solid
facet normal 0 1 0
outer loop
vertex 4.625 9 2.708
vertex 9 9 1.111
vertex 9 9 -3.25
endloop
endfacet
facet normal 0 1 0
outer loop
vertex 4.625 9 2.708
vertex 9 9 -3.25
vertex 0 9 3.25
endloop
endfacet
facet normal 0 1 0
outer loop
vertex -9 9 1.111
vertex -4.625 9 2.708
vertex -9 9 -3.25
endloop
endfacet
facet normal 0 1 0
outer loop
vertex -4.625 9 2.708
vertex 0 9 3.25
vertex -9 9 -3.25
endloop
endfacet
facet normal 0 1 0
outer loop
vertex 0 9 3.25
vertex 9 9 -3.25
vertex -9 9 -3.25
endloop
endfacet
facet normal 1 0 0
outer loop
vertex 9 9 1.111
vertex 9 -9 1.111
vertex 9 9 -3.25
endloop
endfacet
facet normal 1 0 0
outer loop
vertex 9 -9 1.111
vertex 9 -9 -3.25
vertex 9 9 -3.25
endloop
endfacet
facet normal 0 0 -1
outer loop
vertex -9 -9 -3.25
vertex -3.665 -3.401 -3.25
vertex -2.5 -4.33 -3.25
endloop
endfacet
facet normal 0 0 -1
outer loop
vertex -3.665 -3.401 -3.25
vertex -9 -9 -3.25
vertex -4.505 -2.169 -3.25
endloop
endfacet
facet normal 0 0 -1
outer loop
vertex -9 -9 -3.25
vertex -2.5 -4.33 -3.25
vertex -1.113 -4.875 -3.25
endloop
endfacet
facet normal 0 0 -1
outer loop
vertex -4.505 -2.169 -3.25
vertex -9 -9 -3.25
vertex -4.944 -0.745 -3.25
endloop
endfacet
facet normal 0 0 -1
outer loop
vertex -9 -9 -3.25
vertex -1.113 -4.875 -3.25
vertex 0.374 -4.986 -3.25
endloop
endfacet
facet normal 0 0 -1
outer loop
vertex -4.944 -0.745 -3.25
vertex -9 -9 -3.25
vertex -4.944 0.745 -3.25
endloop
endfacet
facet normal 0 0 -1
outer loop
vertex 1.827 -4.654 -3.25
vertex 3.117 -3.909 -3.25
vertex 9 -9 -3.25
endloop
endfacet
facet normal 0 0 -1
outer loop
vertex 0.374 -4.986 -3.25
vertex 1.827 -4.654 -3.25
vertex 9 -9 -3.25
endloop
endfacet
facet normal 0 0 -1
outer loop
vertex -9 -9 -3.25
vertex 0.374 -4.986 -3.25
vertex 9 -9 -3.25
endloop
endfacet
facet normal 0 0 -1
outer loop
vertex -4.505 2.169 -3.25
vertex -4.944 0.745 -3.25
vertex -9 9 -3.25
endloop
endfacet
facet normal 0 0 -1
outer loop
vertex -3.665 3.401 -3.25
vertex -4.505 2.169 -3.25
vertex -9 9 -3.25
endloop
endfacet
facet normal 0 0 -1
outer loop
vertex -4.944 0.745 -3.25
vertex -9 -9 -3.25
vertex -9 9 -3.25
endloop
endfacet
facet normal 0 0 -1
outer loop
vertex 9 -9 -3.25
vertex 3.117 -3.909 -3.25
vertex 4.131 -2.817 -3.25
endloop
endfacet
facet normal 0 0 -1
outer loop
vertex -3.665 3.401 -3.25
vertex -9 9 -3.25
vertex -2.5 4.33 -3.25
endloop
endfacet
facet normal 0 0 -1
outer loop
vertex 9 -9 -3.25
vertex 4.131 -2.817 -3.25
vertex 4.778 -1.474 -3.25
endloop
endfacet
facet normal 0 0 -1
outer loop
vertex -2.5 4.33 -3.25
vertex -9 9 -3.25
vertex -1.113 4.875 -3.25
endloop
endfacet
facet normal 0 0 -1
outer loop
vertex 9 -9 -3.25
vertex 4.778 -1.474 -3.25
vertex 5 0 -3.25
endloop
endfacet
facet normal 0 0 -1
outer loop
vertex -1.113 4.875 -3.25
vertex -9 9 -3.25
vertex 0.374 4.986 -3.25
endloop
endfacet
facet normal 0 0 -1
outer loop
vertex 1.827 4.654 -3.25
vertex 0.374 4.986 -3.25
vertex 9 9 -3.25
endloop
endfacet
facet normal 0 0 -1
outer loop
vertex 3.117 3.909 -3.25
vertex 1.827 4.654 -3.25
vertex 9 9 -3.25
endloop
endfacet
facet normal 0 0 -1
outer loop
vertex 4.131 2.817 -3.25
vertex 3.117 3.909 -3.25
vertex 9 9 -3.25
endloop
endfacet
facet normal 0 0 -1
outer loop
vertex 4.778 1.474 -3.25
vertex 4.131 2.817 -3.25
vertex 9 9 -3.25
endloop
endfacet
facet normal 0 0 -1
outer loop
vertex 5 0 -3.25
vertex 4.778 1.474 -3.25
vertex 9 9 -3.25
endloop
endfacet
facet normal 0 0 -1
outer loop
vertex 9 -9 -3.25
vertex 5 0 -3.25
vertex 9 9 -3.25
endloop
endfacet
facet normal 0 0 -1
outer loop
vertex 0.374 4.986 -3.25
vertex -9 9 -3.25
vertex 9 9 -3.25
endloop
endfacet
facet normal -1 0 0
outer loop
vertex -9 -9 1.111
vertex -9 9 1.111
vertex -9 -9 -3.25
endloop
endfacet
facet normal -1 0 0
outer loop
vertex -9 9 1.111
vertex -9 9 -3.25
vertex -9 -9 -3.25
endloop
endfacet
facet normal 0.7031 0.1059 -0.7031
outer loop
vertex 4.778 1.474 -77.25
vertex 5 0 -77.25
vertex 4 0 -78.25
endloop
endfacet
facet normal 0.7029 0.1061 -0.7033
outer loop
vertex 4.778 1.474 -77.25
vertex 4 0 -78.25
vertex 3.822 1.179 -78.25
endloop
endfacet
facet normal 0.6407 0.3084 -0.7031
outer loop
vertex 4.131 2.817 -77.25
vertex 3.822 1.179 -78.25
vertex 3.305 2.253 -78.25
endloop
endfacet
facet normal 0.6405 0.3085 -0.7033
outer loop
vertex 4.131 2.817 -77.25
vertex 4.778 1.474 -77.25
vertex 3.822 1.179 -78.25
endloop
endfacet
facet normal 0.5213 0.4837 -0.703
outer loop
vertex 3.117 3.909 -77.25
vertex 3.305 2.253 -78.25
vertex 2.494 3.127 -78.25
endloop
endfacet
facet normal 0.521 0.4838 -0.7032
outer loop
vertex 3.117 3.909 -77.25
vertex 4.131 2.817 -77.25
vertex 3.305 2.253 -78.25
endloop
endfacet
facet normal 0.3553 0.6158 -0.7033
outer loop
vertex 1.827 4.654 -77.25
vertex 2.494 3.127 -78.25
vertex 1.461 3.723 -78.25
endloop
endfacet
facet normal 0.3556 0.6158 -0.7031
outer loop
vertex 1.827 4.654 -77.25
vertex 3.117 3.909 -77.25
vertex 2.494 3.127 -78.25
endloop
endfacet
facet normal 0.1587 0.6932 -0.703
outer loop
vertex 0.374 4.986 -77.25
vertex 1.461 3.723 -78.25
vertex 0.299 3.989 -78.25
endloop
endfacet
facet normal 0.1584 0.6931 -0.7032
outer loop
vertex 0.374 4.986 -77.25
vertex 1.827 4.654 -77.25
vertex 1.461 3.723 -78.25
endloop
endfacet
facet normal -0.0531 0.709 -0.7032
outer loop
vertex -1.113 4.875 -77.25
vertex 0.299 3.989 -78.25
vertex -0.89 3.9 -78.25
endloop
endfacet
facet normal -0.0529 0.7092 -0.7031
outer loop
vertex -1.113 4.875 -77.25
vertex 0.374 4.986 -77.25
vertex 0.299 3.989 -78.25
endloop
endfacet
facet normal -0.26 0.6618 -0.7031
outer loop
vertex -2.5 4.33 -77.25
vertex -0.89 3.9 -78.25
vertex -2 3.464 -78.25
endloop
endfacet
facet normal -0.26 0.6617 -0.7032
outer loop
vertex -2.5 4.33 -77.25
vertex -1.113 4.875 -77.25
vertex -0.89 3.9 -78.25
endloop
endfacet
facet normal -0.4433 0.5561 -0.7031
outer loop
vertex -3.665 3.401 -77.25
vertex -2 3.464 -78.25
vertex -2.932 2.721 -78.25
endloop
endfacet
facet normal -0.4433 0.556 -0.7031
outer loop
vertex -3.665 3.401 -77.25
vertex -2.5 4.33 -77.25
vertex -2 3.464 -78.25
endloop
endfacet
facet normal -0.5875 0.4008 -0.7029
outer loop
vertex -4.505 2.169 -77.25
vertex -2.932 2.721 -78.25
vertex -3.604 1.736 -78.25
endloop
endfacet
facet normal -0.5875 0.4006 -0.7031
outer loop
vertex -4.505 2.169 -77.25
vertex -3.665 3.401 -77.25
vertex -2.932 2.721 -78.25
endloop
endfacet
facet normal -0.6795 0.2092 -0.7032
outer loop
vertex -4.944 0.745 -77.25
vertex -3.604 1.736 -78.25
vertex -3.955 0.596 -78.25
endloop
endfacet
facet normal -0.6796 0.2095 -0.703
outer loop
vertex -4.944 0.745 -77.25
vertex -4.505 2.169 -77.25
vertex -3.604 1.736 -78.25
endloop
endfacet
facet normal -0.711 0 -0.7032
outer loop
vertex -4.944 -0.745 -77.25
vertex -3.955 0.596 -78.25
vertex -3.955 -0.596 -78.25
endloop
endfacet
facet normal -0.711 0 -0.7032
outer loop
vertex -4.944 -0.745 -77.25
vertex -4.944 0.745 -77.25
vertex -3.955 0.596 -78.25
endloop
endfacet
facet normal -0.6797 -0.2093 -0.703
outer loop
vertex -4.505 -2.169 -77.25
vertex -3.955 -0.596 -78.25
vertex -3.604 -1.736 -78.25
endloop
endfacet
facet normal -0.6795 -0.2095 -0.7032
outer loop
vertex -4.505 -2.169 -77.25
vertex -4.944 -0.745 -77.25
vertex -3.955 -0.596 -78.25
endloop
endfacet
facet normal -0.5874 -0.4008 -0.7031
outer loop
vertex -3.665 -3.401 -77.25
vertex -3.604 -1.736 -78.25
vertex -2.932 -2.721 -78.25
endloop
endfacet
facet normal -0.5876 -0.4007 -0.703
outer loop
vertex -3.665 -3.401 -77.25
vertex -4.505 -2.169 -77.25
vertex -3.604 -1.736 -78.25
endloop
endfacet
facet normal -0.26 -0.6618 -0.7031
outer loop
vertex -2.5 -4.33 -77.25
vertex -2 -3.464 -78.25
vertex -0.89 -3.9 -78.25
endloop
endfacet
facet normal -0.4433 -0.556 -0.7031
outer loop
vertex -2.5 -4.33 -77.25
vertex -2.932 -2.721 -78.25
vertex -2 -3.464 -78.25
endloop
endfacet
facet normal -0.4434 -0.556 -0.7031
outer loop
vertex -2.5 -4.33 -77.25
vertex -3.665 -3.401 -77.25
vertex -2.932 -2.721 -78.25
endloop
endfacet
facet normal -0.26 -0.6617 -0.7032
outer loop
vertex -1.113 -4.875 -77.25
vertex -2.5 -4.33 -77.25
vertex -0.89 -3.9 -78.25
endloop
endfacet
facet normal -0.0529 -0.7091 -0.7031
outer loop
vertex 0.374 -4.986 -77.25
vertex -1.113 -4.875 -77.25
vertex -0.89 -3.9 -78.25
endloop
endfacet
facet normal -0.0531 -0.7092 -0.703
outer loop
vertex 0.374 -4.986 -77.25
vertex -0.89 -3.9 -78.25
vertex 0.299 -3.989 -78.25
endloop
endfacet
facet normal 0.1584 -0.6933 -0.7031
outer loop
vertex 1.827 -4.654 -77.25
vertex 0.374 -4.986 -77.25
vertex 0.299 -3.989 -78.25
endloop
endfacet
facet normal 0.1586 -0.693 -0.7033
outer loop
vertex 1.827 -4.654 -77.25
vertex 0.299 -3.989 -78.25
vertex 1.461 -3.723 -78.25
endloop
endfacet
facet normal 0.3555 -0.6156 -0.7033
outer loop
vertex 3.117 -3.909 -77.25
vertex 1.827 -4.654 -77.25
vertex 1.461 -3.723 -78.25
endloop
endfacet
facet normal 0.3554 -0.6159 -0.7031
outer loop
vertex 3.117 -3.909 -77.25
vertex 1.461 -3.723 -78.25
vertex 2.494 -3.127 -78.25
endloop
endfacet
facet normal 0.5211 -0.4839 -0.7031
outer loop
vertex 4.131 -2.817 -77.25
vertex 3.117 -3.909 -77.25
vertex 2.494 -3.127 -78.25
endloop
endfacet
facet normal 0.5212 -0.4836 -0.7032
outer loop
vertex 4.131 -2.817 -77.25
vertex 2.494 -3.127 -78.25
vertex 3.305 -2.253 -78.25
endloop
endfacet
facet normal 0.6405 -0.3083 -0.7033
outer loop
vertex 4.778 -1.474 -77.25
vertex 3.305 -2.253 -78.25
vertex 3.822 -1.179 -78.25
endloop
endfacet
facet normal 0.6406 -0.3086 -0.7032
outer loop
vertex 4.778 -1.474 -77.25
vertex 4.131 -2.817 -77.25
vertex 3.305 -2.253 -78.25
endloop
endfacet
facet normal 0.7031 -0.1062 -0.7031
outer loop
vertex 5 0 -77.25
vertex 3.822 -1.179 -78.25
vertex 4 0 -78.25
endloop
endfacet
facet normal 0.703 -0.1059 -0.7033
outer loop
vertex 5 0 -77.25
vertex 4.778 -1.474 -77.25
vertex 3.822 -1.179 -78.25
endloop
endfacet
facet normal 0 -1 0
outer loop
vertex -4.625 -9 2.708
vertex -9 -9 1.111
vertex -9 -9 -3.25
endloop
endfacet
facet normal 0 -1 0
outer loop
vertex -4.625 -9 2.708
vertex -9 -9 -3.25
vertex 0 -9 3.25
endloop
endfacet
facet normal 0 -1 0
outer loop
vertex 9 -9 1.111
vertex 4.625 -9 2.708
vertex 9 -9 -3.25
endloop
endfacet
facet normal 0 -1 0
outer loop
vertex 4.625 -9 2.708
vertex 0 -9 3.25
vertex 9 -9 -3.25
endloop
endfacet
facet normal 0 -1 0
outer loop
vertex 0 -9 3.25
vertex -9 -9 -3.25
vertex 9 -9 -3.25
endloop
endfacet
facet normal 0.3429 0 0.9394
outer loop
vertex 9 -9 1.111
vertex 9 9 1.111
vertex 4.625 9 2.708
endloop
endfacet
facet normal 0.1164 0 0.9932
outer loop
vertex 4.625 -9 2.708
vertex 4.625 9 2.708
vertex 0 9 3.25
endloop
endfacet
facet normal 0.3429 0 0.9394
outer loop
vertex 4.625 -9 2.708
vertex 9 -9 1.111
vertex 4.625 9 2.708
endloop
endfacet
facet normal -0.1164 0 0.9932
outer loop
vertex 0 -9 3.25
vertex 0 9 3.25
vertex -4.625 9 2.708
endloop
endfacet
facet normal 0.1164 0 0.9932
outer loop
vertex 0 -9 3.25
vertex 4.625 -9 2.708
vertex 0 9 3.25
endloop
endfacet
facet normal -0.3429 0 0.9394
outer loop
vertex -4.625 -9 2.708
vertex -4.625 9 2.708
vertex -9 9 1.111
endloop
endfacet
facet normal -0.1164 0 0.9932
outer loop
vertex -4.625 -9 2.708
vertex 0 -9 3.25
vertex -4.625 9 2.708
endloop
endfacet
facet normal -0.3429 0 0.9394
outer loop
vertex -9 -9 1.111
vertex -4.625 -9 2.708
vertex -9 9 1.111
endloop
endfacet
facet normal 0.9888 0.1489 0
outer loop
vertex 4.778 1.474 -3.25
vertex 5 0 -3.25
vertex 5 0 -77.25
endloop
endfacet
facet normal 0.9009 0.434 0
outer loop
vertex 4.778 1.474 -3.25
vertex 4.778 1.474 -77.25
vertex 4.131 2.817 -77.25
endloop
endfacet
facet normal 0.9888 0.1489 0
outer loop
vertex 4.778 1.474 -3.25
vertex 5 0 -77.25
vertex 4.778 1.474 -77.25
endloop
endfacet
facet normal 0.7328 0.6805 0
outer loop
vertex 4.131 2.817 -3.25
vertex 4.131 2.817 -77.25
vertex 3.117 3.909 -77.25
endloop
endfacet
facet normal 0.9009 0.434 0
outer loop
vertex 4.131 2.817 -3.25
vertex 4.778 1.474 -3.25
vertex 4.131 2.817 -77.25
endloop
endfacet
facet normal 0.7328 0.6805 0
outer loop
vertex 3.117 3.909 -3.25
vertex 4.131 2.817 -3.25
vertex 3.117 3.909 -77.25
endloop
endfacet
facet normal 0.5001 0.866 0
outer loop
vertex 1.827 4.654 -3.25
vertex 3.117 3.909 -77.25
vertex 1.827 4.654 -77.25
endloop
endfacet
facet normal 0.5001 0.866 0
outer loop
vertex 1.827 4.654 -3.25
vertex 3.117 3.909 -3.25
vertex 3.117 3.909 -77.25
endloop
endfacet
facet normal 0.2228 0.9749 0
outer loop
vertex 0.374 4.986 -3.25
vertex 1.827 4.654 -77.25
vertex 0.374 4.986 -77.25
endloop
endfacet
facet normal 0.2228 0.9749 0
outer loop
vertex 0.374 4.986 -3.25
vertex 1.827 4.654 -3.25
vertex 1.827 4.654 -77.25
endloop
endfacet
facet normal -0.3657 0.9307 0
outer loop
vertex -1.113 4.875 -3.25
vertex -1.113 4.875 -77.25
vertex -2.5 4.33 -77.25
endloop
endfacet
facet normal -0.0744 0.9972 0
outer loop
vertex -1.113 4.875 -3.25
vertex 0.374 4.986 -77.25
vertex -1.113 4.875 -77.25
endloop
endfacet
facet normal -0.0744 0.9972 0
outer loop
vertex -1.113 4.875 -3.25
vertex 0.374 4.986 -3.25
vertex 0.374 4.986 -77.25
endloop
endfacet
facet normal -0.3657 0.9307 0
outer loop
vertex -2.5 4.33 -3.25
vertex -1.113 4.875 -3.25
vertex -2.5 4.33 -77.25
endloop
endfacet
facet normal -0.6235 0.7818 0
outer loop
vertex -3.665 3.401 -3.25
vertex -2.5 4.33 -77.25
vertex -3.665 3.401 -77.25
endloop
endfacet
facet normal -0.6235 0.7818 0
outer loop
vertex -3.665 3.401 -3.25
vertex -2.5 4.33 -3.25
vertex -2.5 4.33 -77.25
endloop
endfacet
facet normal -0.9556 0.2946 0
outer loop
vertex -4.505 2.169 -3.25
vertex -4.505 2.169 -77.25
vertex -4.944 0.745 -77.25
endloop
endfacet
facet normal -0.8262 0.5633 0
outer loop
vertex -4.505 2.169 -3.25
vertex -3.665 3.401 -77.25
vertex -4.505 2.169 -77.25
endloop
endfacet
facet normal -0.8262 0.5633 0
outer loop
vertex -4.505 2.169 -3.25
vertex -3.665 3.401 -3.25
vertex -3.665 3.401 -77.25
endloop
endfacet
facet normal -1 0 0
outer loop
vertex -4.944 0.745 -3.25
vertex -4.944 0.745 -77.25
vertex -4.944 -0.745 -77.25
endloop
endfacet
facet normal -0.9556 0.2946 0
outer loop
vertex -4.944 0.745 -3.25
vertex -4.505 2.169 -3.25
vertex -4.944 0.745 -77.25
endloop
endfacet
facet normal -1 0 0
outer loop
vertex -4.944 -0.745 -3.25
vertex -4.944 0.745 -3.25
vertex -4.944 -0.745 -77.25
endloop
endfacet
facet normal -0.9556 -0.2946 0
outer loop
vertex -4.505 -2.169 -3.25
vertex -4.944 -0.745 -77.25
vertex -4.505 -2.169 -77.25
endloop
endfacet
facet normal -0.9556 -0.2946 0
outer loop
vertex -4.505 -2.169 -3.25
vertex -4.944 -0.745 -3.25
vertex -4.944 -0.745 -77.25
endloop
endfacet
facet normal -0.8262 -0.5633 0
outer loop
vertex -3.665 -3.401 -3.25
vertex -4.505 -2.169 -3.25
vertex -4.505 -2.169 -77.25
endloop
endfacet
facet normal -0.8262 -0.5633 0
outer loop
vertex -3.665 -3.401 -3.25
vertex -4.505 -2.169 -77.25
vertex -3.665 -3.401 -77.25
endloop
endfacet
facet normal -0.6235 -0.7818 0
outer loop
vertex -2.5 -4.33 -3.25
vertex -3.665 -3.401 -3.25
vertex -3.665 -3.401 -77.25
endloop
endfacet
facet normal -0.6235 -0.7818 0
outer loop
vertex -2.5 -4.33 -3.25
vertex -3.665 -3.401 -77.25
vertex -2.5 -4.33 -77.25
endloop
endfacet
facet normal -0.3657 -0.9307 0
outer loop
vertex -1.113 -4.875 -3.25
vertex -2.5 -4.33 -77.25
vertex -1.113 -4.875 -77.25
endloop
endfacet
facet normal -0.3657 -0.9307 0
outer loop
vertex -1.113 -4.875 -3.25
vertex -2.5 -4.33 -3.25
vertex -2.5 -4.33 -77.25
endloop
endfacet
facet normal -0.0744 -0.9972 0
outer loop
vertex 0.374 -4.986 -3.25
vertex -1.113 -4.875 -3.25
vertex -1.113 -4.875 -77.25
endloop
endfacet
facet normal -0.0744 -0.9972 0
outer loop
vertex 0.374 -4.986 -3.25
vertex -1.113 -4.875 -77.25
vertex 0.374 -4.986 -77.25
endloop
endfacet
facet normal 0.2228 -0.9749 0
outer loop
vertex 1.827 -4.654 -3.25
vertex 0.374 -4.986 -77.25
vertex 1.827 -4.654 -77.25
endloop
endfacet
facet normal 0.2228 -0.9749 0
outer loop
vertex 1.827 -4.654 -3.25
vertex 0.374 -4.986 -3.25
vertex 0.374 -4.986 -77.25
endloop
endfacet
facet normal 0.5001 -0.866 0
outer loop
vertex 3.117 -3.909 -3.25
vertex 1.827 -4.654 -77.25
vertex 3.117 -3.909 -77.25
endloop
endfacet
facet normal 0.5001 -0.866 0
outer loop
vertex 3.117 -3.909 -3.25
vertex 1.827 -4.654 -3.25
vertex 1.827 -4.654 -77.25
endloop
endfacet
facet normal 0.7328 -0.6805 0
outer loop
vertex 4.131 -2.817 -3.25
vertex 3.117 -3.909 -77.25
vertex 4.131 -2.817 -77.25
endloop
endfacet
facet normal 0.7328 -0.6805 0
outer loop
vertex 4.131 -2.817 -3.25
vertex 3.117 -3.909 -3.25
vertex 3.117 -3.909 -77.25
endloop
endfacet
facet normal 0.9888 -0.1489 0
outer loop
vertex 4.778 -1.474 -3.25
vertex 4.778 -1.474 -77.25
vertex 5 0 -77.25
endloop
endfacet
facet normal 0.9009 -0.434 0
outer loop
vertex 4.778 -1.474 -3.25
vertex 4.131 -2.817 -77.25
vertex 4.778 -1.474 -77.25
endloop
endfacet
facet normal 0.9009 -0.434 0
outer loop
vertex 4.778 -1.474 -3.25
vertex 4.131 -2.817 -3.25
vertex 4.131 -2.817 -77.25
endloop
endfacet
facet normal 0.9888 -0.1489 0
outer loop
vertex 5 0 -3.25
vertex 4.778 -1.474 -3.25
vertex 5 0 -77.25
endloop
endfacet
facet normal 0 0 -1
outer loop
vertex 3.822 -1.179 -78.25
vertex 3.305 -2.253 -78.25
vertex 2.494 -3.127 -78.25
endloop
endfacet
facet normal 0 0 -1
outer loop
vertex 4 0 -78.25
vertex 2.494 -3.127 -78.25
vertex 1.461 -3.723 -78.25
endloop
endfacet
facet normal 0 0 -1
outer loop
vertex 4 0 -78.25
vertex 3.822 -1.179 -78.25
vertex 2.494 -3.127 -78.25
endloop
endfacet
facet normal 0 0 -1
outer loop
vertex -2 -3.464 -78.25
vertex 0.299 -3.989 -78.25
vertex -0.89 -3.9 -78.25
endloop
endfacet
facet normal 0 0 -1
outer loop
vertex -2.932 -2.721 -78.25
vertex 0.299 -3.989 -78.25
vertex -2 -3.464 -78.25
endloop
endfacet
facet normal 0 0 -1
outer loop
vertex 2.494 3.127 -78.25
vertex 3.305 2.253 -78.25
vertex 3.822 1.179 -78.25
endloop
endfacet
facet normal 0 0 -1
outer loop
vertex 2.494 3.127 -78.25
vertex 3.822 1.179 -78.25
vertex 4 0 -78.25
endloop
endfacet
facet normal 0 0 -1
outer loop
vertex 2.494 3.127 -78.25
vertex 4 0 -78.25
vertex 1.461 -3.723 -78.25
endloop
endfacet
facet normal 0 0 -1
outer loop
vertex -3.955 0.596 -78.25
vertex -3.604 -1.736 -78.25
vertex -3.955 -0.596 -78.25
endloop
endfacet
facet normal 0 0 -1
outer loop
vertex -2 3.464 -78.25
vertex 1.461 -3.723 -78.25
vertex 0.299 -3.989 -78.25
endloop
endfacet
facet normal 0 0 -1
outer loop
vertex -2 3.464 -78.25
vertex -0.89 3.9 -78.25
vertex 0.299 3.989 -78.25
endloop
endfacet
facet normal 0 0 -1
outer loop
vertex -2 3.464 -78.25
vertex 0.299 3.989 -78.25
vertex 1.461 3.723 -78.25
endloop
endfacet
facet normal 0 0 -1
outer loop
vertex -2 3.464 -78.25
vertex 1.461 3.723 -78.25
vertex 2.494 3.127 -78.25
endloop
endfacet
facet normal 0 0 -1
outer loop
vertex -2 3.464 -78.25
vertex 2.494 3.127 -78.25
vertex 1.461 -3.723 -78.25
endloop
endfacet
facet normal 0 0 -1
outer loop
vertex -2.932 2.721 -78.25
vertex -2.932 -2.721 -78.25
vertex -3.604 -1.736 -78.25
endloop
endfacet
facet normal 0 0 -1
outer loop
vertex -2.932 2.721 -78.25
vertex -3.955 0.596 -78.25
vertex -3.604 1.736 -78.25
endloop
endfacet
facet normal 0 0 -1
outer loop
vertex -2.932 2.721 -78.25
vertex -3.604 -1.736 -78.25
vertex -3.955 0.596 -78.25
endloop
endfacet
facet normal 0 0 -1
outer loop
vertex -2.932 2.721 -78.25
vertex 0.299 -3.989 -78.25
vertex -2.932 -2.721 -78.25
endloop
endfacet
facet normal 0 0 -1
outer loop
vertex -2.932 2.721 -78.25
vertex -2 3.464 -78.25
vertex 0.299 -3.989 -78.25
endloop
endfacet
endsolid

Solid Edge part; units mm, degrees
sketch "Sketch1" plane through (0, 0, 0) normal (0, 0, 1) x (1, 0, 0)
  line L0 (-9, -9) -> (9, -9)
  line L1 (9, -9) -> (9, 9)
  line L2 (9, 9) -> (-9, 9)
  line L3 (-9, 9) -> (-9, -9)
extrude "Protrusion1" add sketch "Sketch1" along normal mid plane 6.5
sketch "Sketch2" plane through (0, 0, -3.25) normal (0, 0, -1) x (1, 0, 0)
  circle A0 centre (0, 0) radius 5
extrude "ExtrudedProtrusion_2" add sketch "Sketch2" along normal blind 75 and the other way blind 35.9412
sketch "Sketch3" plane through (0, -9, 0) normal (0, -1, 0) x (1, 0, 0)
  line L0 (23.9875, 3.25) -> (23.9875, 36.6911)
  line L1 (23.9875, 36.6911) -> (-10.6415, 36.6911)
  line L2 (-10.6415, 36.6911) -> (-10.6415, 3.25)
  line L3 (-10.6415, 3.25) -> (9, 3.25)
  line L4 (9, 3.25) -> (23.9875, 3.25)
extrude "Cutout1" cut sketch "Sketch3" against normal through all and the other way through all
cosmetic_thread "Thread_1" size "Tr 10 x 2" thread depth 26
chamfer "Chamfer_1" distance 1 angle 45 1 edges at (-5, 0, -78.25)
sketch "Sketch4" plane through (0, -9, 0) normal (0, -1, 0) x (1, 0, 0)
  line L0 (-14.1953, 12.3388) -> (14.0888, 12.3388)
  line L1 (14.0888, 12.3388) -> (14.0888, -2.5547)
  arc A0 (-14.1953, -2.6612) -> (14.0888, -2.5547) centre (0, -16.75) cw
  line L2 (-14.1953, -2.6612) -> (-14.1953, 12.3388)
extrude "ExtrudedCutout_3" cut sketch "Sketch4" against normal blind 36.133 and the other way blind 1.0534
